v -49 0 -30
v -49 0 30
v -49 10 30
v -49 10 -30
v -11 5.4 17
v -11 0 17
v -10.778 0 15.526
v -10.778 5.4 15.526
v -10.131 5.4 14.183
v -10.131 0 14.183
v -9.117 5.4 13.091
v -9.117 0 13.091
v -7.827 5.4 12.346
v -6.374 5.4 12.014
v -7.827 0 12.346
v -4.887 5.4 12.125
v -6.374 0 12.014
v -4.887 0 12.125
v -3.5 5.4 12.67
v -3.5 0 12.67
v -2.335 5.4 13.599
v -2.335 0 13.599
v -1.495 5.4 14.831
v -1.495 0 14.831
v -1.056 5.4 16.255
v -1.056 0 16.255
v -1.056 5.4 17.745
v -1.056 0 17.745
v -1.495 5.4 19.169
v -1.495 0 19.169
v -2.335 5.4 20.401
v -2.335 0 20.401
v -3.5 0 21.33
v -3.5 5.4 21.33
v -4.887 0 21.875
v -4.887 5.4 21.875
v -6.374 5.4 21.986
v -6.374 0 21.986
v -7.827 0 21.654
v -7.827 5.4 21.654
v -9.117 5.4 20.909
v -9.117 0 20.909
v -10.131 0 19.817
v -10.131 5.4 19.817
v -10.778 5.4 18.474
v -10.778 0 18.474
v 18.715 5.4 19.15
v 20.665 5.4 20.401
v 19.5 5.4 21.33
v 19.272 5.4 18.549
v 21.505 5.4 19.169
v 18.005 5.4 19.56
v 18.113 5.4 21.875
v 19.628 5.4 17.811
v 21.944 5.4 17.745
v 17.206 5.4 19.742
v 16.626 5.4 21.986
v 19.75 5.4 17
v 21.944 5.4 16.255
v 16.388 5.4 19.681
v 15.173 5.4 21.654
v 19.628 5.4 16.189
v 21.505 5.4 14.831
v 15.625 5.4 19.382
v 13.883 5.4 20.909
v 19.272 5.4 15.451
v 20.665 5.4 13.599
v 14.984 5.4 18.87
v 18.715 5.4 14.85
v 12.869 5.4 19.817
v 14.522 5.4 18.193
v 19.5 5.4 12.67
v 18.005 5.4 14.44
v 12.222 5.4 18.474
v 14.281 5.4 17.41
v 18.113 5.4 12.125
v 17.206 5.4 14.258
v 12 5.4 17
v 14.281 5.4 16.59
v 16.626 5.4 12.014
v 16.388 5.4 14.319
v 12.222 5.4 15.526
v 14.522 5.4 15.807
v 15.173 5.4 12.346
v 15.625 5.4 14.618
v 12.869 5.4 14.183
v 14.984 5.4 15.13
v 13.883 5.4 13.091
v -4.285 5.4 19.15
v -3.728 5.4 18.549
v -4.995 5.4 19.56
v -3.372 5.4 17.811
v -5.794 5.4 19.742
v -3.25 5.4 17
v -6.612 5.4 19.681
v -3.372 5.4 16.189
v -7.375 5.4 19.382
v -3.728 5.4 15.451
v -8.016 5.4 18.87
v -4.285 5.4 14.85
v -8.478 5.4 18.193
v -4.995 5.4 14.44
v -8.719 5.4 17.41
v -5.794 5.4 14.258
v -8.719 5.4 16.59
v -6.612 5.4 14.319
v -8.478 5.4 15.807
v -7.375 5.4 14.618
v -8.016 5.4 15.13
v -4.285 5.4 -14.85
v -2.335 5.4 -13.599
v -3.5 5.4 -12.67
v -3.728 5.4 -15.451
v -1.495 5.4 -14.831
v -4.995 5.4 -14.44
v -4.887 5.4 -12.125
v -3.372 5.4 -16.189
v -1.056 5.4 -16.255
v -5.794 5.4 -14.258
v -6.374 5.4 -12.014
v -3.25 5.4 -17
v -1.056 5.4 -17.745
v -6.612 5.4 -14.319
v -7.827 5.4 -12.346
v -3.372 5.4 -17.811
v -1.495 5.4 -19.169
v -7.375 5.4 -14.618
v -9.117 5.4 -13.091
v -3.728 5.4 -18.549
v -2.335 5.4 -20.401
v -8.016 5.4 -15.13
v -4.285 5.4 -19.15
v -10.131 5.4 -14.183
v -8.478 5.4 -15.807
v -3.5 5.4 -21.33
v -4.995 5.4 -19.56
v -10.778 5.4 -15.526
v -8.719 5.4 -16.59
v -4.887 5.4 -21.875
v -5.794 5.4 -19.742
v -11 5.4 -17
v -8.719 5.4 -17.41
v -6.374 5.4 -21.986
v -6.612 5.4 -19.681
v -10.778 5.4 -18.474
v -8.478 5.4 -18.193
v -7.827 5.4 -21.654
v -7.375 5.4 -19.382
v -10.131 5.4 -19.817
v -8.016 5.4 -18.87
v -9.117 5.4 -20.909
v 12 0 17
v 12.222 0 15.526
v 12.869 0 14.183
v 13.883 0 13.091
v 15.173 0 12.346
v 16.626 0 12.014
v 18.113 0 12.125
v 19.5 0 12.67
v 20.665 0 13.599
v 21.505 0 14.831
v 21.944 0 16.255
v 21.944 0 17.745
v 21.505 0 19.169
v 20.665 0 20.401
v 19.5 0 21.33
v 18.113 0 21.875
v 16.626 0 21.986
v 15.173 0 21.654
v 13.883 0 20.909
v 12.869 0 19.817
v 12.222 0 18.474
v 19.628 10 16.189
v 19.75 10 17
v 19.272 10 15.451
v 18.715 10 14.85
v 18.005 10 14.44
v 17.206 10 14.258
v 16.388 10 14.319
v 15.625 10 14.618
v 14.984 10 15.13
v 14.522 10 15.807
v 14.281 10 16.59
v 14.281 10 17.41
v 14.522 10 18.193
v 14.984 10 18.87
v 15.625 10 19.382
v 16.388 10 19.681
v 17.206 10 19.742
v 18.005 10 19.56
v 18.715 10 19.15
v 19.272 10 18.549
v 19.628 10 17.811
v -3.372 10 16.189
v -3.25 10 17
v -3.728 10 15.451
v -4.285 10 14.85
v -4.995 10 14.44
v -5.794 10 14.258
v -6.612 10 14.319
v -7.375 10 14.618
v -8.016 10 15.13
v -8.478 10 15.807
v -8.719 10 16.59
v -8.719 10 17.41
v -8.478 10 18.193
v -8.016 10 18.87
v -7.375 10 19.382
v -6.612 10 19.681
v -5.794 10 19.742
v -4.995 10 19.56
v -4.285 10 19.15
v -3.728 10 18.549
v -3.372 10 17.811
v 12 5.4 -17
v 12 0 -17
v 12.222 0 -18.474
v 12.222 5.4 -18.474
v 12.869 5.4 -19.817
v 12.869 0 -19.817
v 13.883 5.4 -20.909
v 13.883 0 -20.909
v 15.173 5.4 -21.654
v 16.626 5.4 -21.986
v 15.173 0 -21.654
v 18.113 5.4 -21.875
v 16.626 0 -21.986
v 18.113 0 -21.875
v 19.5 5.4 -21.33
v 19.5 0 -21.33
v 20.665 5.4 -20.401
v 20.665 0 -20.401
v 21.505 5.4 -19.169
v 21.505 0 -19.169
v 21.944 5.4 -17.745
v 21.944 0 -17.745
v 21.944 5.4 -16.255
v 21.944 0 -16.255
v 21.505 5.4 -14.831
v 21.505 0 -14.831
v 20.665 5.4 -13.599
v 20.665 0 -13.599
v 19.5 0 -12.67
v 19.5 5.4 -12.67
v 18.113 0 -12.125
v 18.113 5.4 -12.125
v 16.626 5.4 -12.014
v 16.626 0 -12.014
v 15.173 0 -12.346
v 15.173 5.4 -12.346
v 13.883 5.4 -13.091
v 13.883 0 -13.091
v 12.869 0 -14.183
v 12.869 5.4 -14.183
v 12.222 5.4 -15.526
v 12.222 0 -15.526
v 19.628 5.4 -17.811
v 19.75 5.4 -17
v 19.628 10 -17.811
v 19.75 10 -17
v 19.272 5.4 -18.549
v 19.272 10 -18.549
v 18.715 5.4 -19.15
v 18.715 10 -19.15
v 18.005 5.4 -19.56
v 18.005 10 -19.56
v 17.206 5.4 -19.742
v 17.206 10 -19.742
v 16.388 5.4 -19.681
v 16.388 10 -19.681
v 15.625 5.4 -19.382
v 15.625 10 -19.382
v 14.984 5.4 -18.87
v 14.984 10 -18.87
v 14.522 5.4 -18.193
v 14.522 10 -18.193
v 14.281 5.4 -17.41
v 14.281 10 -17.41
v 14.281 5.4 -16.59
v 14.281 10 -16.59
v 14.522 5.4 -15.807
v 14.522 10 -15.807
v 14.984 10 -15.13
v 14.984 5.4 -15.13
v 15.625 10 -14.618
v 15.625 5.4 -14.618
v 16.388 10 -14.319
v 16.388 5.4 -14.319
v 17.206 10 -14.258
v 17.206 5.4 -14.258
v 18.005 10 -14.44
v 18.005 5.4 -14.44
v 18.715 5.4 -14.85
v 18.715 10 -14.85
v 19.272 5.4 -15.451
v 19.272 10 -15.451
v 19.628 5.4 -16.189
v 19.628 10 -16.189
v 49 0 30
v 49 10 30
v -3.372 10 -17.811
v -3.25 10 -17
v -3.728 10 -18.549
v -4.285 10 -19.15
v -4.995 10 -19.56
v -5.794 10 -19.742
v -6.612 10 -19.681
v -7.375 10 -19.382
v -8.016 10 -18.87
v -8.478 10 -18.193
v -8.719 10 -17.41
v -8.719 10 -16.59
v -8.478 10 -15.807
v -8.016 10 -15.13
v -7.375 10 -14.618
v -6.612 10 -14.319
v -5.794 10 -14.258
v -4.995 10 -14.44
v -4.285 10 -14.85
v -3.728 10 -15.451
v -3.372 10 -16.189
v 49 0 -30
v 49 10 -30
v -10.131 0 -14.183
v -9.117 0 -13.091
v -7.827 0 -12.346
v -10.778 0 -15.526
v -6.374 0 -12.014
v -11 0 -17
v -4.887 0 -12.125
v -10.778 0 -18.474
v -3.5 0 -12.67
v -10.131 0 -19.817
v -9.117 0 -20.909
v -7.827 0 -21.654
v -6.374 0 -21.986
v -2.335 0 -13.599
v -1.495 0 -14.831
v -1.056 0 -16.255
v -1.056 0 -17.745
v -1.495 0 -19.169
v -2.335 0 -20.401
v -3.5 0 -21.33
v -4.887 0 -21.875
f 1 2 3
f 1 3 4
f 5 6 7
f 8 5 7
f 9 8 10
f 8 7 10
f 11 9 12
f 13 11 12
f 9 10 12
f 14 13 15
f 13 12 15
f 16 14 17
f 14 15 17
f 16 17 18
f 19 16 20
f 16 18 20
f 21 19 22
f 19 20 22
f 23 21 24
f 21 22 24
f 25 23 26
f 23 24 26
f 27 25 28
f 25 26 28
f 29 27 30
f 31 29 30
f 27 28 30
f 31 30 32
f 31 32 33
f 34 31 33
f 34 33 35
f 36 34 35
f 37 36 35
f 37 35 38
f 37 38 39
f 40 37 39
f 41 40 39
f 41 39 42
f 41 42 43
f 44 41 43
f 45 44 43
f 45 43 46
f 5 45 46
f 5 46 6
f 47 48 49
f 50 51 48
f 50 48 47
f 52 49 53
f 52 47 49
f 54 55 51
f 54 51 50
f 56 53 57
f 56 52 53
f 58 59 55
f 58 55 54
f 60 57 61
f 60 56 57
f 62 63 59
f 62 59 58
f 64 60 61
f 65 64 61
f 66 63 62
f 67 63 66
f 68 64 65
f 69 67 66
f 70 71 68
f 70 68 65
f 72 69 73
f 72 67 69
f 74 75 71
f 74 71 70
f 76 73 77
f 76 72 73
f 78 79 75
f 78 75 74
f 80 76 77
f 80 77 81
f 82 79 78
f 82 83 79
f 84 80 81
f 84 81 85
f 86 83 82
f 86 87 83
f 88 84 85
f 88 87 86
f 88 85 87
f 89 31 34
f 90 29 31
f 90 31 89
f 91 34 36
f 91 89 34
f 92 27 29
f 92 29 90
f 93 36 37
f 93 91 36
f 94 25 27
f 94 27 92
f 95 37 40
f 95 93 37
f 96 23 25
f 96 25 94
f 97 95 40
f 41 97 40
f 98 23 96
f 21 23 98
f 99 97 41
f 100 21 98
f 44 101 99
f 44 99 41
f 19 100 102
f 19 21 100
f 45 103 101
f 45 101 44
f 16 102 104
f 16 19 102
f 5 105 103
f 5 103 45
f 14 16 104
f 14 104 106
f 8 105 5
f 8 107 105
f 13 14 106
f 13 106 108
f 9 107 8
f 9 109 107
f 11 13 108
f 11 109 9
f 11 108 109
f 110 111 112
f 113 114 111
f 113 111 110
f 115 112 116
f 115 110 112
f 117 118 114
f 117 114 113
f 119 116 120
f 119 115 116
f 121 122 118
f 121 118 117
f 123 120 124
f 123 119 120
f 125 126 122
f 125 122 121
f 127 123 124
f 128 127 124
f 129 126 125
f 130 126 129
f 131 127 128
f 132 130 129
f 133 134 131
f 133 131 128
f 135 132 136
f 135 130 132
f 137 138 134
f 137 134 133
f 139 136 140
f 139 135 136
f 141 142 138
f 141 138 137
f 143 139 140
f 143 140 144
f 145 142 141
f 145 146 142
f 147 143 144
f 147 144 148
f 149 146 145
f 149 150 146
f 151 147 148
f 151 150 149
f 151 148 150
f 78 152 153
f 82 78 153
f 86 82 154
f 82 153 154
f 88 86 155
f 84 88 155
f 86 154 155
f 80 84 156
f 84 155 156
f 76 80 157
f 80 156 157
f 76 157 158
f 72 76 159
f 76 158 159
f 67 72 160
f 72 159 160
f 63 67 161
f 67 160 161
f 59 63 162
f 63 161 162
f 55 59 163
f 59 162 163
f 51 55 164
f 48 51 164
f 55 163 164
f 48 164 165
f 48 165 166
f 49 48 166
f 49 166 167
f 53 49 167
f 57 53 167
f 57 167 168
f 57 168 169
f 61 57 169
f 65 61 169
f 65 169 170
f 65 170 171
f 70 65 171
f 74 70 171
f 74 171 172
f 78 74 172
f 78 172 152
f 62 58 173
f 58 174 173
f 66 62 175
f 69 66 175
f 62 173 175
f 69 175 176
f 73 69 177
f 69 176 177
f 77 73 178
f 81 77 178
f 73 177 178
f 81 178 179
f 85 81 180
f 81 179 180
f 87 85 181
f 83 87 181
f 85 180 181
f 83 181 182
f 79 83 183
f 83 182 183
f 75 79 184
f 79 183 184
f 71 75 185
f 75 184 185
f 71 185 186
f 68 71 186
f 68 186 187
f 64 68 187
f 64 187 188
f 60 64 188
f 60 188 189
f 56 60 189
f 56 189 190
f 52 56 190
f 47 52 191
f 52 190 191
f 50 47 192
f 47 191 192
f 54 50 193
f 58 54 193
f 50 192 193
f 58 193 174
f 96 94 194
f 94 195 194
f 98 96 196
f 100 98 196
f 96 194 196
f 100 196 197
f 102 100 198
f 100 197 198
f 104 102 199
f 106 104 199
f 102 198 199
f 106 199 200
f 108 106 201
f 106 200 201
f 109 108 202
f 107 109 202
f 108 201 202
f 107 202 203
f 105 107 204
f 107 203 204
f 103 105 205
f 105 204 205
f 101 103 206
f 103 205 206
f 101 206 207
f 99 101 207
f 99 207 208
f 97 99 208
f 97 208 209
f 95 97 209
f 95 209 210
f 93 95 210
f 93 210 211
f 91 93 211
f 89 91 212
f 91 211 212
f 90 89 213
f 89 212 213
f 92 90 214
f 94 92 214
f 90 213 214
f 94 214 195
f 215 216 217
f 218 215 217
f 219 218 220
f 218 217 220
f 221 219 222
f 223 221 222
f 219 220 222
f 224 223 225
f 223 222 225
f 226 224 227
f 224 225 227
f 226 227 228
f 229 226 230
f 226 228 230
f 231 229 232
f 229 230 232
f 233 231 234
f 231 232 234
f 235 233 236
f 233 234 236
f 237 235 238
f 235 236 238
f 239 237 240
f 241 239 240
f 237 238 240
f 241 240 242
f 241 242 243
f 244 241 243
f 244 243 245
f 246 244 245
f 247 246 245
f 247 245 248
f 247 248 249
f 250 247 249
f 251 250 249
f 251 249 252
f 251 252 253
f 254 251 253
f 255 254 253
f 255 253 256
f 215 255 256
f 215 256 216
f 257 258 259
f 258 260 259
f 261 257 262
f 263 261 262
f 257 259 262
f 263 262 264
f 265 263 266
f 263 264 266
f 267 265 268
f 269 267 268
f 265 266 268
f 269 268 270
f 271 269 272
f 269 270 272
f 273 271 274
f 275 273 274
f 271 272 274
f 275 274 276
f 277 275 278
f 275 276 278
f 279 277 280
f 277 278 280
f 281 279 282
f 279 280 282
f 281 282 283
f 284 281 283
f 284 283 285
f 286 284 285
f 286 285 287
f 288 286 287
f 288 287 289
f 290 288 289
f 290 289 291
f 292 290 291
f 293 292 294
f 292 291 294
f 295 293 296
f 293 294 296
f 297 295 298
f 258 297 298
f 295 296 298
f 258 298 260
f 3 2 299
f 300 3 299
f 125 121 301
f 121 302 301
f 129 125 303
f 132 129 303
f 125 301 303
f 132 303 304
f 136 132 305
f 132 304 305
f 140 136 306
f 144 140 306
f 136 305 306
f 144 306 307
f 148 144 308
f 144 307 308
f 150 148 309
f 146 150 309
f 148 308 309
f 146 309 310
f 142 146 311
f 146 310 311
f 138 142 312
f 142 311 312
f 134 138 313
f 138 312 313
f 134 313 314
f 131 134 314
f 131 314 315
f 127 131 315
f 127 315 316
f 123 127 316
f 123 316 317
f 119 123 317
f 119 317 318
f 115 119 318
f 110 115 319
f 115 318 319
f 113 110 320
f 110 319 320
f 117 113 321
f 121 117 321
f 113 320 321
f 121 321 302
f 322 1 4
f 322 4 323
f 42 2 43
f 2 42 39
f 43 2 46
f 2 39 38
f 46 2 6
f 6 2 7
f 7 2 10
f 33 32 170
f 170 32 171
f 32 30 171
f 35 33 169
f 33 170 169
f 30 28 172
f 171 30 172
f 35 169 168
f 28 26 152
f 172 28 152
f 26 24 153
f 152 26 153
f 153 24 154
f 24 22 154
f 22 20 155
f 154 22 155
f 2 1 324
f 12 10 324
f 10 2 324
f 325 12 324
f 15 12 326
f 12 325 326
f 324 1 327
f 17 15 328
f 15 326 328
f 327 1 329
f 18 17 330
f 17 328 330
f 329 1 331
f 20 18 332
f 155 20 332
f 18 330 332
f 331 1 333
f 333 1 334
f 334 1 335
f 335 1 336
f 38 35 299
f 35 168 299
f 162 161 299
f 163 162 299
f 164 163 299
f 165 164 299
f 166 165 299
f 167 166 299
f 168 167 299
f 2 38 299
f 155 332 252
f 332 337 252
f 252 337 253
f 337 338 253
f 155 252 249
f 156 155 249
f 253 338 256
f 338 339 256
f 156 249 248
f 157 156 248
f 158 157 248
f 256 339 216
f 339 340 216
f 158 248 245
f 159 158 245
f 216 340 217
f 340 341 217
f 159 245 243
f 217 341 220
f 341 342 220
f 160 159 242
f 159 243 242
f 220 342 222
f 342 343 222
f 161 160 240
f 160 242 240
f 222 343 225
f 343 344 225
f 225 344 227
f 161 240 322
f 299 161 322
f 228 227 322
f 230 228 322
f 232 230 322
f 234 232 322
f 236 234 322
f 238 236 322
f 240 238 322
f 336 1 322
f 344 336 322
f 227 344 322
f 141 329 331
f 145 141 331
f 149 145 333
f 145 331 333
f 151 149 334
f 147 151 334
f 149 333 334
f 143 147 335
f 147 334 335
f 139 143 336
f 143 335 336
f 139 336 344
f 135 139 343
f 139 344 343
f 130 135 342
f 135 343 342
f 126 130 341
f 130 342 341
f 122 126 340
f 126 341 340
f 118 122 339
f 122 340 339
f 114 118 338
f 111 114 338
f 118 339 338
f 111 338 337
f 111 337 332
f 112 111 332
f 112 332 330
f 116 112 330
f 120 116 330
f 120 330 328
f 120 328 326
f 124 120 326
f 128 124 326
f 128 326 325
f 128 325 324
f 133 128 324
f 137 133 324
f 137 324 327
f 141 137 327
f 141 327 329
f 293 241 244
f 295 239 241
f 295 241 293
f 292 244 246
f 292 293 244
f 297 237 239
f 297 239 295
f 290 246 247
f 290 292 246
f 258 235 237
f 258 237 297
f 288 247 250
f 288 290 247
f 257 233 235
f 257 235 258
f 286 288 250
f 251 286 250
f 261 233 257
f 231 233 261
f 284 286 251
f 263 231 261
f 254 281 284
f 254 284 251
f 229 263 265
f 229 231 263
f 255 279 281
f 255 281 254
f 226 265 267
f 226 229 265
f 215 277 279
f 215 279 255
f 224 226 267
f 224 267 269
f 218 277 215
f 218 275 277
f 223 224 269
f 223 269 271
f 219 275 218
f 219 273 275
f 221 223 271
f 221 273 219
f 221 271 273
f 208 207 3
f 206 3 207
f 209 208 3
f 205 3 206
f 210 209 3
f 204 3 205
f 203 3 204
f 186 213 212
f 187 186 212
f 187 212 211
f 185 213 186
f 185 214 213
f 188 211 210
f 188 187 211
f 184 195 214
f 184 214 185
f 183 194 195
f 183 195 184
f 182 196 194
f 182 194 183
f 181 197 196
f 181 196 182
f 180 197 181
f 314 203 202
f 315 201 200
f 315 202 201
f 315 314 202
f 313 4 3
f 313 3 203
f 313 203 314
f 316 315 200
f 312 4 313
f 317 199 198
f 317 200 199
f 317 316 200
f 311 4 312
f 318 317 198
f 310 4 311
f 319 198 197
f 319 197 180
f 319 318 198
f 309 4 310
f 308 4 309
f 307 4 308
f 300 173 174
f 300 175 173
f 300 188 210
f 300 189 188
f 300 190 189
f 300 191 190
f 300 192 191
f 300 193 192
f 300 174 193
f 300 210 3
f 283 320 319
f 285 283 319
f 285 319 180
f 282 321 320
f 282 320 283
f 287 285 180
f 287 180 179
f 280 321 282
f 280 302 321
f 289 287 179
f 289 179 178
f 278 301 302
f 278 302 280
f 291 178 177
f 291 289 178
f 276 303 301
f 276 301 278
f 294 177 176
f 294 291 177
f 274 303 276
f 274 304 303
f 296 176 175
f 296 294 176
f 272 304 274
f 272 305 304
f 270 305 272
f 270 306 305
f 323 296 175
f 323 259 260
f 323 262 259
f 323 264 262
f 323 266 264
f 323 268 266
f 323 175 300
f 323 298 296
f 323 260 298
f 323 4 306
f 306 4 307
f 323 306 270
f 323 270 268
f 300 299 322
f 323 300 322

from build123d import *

# Parameters (mm, degrees)
SKETCH1_W                                           = 98
SKETCH1_H                                           = 60
BOSS_EXTRUDE1_DEPTH                                 = 10
CBORE_FOR_M5_HEX_SOCKET_HEAD_CAP_SCREW1_D           = 5.5
CBORE_FOR_M5_HEX_SOCKET_HEAD_CAP_SCREW1_CBORE_D     = 10
CBORE_FOR_M5_HEX_SOCKET_HEAD_CAP_SCREW1_CBORE_DEPTH = 5.4


with BuildPart() as part:
    # Sketch1 → Boss-Extrude1 (new body)
    with BuildSketch(Plane(origin=(0, 0, 0), x_dir=(1, 0, 0), z_dir=(0, 1, 0))):
        Rectangle(SKETCH1_W, SKETCH1_H)
    extrude(amount=BOSS_EXTRUDE1_DEPTH)

    # CBORE for M5 Hex Socket Head Cap Screw1 (through all)
    with Locations(Plane(origin=(0, 0, 0), x_dir=(-1, 0, 0), z_dir=(0, -1, 0))):
        with Locations((6, 17), (-17, 17), (-17, -17), (6, -17)):
            CounterBoreHole(CBORE_FOR_M5_HEX_SOCKET_HEAD_CAP_SCREW1_D / 2, CBORE_FOR_M5_HEX_SOCKET_HEAD_CAP_SCREW1_CBORE_D / 2, CBORE_FOR_M5_HEX_SOCKET_HEAD_CAP_SCREW1_CBORE_DEPTH)


solid = part.part
